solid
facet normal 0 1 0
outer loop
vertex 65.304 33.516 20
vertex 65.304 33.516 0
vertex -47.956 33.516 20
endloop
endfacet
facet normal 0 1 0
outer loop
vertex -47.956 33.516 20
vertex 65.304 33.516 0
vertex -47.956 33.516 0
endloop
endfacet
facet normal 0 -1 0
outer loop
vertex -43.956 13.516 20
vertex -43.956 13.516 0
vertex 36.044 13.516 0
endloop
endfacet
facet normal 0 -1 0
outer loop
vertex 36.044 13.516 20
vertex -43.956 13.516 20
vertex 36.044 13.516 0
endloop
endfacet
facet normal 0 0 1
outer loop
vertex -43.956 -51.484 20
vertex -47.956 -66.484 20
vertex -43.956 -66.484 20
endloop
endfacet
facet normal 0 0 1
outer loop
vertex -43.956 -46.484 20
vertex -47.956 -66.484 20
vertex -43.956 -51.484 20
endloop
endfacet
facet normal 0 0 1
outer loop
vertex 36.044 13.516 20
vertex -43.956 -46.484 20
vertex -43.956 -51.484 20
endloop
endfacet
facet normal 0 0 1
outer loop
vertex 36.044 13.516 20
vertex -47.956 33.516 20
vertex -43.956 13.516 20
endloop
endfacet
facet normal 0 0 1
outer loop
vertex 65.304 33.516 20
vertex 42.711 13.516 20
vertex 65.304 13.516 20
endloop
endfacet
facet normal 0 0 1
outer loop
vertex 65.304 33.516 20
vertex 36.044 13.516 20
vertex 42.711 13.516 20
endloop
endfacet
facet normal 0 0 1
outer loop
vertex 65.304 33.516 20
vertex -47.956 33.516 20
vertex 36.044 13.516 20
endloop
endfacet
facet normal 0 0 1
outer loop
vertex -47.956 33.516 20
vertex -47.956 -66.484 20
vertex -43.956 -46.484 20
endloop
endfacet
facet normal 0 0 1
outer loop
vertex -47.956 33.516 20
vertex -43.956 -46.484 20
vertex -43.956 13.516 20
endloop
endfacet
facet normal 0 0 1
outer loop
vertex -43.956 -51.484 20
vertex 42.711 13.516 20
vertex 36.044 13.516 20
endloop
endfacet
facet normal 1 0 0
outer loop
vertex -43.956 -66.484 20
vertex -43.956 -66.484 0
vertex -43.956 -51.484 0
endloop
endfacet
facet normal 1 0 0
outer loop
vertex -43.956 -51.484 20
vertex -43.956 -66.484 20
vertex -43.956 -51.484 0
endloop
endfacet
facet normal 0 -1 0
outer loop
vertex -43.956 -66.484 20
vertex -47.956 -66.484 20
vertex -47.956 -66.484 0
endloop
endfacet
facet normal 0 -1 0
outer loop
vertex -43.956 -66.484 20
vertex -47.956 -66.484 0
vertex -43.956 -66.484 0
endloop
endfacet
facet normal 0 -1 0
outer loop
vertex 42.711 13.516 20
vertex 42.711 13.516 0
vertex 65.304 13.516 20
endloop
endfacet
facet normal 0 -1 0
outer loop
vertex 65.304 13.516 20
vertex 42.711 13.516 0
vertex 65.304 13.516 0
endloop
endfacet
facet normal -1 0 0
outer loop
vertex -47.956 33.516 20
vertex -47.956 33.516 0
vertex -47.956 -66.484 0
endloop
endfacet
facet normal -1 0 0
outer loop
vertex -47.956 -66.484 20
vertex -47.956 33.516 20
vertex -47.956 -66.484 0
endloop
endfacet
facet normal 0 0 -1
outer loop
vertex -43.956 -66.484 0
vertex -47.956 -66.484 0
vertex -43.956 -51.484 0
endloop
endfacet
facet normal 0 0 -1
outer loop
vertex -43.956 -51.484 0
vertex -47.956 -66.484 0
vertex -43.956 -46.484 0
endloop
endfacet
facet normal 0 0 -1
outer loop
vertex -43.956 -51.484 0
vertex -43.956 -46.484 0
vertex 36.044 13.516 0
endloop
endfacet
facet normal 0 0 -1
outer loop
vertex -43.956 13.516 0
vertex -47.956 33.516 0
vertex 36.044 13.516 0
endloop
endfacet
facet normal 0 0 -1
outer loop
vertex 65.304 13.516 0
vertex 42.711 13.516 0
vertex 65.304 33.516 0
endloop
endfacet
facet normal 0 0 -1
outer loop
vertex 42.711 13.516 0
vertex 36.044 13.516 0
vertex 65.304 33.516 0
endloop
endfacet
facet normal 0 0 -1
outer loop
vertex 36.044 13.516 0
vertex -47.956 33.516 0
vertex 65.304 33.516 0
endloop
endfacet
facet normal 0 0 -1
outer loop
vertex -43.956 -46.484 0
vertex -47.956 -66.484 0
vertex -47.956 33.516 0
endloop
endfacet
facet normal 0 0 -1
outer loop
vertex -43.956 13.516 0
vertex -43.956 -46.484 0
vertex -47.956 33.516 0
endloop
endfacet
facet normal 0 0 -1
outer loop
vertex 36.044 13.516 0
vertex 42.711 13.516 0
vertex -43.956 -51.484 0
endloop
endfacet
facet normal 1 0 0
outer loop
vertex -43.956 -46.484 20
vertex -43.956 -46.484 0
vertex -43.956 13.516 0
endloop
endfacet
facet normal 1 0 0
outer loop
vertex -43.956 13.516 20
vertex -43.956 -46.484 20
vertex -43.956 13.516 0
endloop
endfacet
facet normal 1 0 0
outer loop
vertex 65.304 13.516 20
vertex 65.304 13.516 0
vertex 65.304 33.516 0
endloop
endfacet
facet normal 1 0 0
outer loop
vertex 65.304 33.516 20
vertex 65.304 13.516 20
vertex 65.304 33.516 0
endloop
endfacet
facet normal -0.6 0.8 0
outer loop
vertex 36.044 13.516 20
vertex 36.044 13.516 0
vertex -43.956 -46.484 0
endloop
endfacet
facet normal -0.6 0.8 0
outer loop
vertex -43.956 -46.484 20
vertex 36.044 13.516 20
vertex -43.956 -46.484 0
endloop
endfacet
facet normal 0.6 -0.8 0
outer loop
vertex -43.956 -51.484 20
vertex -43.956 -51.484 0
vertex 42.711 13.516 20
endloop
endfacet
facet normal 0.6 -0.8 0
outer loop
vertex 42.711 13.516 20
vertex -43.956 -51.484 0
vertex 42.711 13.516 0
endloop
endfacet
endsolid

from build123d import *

# Parameters (mm, degrees)
BOSS_EXTRUDE1_DEPTH = 20


with BuildPart() as part:
    # Sketch1 → Boss-Extrude1 (new body)
    with BuildSketch(Plane.XY):
        Polygon((65.303956044, 33.516483516), (-43.956043956, 33.516483516), (-47.956043956, 33.516483516), (-47.956043956, -66.483516484), (-43.956043956, -66.483516484), (-43.956043956, -51.483516484), (42.710622711, 13.516483516), (65.303956044, 13.516483516), align=None)
        Polygon((36.043956044, 13.516483516), (-43.956043956, -46.483516484), (-43.956043956, 13.516483516), align=None, mode=Mode.SUBTRACT)
    extrude(amount=BOSS_EXTRUDE1_DEPTH)


solid = part.part
